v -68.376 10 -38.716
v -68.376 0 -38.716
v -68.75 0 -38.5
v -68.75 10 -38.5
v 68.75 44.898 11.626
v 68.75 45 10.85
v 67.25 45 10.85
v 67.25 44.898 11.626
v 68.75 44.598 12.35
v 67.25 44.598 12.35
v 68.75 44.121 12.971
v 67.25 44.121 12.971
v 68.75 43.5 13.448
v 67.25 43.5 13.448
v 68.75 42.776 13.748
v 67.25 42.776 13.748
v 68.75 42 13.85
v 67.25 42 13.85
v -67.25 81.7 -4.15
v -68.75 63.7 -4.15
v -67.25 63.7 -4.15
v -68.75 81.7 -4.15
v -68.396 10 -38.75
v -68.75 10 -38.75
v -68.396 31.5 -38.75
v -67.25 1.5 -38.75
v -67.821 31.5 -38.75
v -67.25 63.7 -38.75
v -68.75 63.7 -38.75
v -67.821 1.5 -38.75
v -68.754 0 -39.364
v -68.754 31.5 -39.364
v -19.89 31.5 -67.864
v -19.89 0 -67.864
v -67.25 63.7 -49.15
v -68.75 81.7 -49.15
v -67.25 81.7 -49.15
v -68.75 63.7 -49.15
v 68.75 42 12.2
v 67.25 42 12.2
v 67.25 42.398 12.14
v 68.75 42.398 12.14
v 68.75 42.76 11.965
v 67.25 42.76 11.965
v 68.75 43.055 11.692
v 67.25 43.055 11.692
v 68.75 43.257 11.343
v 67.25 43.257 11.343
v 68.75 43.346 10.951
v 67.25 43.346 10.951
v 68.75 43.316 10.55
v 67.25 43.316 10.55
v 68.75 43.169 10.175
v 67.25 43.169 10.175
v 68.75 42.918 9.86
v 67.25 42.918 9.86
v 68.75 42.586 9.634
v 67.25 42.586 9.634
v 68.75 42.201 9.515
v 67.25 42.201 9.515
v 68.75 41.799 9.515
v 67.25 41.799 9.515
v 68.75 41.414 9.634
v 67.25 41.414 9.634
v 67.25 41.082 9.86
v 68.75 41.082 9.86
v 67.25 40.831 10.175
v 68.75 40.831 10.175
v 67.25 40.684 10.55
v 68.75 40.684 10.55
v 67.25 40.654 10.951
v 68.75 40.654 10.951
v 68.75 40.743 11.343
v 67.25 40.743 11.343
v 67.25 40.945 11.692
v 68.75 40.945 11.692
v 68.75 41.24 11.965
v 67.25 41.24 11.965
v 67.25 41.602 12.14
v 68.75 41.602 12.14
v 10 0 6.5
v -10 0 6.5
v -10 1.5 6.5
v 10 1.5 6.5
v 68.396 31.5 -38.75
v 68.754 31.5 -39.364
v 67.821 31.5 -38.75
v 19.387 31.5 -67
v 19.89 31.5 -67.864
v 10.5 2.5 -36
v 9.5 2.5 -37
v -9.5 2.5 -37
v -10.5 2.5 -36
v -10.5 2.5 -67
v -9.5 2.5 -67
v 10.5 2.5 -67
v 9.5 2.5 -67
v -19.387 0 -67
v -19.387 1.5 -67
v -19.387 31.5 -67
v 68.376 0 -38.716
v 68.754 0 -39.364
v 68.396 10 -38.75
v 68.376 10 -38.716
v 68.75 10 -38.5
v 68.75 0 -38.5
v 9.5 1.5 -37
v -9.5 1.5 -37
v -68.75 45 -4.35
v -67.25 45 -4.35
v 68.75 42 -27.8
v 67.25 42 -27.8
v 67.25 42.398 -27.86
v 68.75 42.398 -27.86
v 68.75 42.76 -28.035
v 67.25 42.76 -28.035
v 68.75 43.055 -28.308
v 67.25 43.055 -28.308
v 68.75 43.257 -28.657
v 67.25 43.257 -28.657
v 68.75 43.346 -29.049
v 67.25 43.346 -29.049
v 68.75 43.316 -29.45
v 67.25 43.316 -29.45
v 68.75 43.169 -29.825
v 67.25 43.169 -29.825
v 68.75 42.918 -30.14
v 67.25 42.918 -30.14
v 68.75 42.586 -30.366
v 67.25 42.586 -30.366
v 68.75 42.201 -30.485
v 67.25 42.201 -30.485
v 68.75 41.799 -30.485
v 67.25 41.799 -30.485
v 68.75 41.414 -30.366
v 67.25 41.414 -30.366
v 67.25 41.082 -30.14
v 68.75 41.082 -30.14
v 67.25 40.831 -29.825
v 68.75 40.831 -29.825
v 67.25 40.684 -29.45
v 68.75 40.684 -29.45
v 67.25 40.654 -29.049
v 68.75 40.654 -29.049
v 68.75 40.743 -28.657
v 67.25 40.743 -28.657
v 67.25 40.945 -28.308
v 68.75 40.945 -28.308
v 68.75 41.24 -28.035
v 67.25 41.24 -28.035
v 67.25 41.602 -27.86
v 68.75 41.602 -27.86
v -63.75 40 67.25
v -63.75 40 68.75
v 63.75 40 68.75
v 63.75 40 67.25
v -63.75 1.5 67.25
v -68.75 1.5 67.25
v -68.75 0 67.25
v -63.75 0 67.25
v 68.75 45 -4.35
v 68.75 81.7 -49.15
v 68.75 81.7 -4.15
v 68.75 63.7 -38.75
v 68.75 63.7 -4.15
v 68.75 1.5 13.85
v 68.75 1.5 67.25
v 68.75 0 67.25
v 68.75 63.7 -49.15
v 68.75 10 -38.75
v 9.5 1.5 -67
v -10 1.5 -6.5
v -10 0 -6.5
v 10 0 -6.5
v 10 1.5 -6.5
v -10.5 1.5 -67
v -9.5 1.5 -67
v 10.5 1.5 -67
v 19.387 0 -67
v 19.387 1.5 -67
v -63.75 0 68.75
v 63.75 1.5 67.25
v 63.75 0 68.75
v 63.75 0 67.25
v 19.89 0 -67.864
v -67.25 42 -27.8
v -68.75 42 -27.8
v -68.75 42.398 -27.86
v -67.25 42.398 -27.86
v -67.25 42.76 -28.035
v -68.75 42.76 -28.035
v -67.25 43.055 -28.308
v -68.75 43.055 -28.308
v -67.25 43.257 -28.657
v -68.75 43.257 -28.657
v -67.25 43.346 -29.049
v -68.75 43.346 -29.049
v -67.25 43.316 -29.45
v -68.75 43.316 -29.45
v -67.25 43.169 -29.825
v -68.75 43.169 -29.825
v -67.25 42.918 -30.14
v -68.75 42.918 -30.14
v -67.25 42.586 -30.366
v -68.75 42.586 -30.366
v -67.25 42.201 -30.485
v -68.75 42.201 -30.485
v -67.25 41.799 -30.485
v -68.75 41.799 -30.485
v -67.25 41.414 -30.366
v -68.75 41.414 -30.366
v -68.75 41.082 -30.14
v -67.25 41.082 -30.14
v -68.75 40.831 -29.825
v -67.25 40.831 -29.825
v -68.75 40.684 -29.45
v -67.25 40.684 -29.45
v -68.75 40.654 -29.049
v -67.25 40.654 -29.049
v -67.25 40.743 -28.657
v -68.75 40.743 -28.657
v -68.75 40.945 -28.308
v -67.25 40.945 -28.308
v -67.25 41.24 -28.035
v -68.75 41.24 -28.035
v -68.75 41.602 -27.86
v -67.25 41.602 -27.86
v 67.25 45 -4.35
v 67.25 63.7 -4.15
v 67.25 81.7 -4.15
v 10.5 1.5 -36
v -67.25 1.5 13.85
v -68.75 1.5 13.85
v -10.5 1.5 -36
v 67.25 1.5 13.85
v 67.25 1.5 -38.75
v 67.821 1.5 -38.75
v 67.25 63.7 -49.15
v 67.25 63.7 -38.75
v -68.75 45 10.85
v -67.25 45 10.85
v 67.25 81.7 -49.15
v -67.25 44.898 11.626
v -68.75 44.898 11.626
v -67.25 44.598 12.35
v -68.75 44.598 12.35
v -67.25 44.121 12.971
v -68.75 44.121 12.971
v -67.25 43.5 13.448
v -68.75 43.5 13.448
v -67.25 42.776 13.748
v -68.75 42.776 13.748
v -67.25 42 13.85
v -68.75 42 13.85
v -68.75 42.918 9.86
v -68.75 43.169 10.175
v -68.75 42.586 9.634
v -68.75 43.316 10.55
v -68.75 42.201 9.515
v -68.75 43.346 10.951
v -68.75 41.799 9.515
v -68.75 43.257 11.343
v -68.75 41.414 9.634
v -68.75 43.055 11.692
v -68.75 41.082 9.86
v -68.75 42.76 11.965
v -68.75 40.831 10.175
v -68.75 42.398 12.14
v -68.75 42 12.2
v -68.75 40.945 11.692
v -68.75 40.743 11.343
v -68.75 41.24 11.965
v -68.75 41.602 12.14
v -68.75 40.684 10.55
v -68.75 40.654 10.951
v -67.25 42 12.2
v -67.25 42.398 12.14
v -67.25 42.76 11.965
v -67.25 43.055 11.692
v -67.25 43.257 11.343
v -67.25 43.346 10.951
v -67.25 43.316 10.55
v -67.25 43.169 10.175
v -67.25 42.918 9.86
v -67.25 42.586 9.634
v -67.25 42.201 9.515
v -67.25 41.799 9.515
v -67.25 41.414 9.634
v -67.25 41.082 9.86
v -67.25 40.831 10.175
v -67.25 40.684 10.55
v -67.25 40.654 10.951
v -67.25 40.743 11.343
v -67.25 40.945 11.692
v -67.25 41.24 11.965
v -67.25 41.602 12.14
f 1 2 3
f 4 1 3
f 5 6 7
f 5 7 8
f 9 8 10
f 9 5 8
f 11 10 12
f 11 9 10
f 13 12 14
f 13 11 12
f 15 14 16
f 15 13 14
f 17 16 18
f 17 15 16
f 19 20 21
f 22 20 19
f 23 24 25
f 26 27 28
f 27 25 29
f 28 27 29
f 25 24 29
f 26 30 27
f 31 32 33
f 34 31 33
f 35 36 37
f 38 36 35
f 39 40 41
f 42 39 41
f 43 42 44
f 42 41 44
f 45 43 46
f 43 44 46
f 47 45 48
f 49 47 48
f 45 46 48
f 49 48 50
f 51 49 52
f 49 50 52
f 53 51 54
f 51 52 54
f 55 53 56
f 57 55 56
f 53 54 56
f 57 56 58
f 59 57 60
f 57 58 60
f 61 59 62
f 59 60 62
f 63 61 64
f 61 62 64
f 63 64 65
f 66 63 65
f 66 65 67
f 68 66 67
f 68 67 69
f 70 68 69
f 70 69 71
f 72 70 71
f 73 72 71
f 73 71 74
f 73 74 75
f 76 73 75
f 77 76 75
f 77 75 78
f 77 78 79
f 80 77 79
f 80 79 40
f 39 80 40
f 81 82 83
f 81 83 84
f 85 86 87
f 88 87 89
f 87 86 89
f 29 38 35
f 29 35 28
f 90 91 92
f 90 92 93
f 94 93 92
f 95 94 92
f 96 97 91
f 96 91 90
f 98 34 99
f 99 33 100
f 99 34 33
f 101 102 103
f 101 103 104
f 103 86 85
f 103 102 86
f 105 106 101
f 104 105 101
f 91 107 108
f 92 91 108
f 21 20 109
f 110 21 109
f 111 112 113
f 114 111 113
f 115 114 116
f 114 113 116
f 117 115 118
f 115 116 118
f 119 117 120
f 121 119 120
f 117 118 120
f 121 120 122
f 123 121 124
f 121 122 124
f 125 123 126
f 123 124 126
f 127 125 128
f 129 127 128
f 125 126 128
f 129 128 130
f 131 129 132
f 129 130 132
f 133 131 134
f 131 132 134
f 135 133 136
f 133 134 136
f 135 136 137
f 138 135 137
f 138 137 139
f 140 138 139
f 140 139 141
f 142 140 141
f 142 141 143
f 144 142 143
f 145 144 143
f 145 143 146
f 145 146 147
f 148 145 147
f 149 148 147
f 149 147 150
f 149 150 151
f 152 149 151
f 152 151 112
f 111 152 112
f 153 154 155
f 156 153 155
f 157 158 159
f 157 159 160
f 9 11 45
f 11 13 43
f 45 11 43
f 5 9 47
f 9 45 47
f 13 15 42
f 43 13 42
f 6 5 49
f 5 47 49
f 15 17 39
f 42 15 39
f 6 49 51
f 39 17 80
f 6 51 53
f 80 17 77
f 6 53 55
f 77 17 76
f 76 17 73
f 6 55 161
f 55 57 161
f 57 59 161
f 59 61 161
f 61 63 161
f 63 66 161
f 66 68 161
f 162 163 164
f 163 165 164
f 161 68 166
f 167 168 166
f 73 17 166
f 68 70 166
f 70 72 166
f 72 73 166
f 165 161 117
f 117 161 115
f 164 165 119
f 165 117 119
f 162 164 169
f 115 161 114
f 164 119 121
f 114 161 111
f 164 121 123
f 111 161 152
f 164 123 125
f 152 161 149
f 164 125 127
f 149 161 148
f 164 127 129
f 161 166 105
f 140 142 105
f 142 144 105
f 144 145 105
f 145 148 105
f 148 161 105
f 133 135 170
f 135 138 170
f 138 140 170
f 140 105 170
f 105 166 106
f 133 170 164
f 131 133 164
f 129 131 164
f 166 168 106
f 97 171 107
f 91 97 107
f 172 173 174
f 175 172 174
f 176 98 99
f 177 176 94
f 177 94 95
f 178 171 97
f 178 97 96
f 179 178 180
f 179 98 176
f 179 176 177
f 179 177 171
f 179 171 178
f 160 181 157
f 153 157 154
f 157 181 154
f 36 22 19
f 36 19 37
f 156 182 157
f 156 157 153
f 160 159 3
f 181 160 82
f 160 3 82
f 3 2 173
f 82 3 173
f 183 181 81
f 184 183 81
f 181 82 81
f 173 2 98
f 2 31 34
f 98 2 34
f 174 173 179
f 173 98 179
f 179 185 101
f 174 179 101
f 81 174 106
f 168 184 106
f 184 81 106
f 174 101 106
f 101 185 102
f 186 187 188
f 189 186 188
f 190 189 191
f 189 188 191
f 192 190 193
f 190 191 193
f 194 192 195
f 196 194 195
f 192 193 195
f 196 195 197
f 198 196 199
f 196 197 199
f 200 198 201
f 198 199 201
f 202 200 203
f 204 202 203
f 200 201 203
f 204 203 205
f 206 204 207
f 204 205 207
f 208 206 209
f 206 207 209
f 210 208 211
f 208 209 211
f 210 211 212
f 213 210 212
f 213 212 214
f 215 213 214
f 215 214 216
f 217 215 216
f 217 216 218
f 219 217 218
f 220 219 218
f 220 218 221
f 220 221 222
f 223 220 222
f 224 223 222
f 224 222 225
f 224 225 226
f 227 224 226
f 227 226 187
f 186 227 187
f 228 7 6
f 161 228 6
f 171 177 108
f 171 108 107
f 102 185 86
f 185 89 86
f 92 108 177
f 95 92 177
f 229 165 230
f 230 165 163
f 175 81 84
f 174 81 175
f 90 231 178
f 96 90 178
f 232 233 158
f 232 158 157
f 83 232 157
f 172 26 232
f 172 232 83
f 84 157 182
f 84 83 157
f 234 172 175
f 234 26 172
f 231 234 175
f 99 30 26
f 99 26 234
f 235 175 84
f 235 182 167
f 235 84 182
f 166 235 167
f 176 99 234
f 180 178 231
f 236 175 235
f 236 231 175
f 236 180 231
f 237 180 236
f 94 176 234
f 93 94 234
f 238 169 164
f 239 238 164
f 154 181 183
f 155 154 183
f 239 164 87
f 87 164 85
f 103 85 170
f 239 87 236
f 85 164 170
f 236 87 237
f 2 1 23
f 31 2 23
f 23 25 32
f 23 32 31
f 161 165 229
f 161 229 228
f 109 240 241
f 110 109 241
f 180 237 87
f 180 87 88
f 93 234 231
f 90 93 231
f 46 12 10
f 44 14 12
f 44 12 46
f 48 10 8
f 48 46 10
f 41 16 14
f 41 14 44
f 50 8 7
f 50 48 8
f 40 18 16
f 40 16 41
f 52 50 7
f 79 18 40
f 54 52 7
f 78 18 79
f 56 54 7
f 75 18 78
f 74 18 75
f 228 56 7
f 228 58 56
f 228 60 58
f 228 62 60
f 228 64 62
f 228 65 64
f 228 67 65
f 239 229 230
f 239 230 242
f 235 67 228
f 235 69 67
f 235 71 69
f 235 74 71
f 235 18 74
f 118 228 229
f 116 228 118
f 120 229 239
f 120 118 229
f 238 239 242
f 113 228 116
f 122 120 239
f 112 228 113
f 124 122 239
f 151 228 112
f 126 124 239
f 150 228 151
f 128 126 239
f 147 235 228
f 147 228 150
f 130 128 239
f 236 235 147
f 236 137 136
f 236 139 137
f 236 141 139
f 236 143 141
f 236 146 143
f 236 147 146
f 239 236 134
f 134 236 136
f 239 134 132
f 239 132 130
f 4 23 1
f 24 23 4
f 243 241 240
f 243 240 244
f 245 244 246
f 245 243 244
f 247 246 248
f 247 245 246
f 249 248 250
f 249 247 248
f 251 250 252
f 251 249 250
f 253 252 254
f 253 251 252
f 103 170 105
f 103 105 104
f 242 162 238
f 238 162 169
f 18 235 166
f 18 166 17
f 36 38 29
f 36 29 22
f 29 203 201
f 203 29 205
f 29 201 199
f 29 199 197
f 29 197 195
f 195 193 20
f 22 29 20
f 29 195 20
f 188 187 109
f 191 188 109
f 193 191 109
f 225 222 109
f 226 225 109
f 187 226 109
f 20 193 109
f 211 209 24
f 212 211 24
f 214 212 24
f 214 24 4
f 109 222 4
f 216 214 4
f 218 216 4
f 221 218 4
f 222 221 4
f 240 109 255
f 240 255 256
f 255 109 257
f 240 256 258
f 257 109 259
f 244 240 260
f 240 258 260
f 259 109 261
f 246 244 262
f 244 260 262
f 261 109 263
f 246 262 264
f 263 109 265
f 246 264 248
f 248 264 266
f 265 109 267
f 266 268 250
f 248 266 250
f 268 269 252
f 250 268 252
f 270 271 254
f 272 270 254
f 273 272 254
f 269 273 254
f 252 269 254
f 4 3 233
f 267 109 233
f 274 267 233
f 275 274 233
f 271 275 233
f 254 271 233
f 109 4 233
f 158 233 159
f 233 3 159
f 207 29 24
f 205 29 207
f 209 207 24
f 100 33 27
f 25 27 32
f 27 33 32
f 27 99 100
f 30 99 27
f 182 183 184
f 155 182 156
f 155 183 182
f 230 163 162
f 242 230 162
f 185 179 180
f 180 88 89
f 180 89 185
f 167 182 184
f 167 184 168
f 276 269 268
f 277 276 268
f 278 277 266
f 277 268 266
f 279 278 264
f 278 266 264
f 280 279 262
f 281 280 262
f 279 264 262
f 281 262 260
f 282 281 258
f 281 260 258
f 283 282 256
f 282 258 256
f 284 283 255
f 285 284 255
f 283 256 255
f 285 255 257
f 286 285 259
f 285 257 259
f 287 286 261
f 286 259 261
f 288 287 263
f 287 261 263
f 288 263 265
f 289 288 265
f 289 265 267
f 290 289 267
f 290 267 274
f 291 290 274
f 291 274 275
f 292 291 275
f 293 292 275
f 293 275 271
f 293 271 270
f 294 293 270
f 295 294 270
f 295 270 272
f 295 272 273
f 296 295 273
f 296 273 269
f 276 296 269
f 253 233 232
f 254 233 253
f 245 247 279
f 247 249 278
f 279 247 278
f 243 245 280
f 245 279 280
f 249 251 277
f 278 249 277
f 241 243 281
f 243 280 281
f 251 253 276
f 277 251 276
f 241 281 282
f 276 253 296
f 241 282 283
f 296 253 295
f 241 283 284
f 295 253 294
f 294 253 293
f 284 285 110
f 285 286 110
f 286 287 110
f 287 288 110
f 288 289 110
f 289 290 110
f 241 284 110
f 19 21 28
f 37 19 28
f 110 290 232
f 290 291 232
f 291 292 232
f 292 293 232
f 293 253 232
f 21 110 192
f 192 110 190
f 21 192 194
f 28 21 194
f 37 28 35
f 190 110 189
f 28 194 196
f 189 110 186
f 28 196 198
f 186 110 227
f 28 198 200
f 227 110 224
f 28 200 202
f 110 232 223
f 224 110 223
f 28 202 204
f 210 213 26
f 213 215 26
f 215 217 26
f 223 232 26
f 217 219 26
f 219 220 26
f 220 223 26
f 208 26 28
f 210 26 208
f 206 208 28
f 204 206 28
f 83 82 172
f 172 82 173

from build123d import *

# Parameters (mm, degrees)
SKETCH1_W                = 134
SKETCH1_H                = 134
SKETCH1_W_2              = 20
SKETCH1_H_2              = 13
BOSS_EXTRUDE1_DEPTH      = 1.5
BOSS_EXTRUDE2_DEPTH      = 45
SKETCH2_R                = 1.35
CUT_EXTRUDE1_DEPTH       = 137.5
SKETCH3_W                = 53.4
SKETCH3_H                = 43.5
CUT_EXTRUDE2_DEPTH       = 137.5
SKETCH4_W                = 140
SKETCH4_H                = 5
CUT_EXTRUDE3_DEPTH       = 1.5
SKETCH5_W                = 30
SKETCH5_H                = 43.5
CUT_EXTRUDE4_DEPTH       = 137.5
CUT_EXTRUDE5_DEPTH       = 10
BOSS_EXTRUDE3_DEPTH      = 1.5
BOSS_EXTRUDE4_DEPTH      = 1
BOSS_EXTRUDE5_DEPTH      = 30
BOSS_EXTRUDE5_DEPTH_BACK = 1.5
CUT_EXTRUDE6_DEPTH       = 137.5
SKETCH11_W               = 5
SKETCH11_H               = 40
CUT_EXTRUDE7_DEPTH       = 1.5
BOSS_EXTRUDE6_DEPTH      = 1.5


with BuildPart() as part:
    # Sketch1 → Boss-Extrude1 (new body)
    with BuildSketch(Plane(origin=(0, 0, 0), x_dir=(1, 0, 0), z_dir=(0, 1, 0))):
        Rectangle(SKETCH1_W, SKETCH1_H)
        Rectangle(SKETCH1_W_2, SKETCH1_H_2, mode=Mode.SUBTRACT)
        Polygon((-67, 67), (-67.25, 67.25), (-67.25, -67.25), (67.25, -67.25), (67.25, 67.25), (67, 67), (67, -67), (-67, -67), align=None)
    extrude(amount=BOSS_EXTRUDE1_DEPTH)

    # Sketch1<3> → Boss-Extrude2 (add)
    with BuildSketch(Plane(origin=(0, 0, 0), x_dir=(1, 0, 0), z_dir=(0, 1, 0))):
        Polygon((-67.25, -67.25), (-67.25, 67.25), (-68.75, 68.75), (-68.75, -68.75), (68.75, -68.75), (68.75, 68.75), (67.25, 67.25), (67.25, -67.25), align=None)
    extrude(amount=BOSS_EXTRUDE2_DEPTH)

    # Sketch2 → Cut-Extrude1 (cut)
    with BuildSketch(Plane.ZY.offset(68.75)):
        with Locations((10.85, 42)):
            Circle(SKETCH2_R)
        with Locations((-29.15, 42)):
            Circle(SKETCH2_R)
    extrude(amount=-CUT_EXTRUDE1_DEPTH, mode=Mode.SUBTRACT)

    # Sketch3 → Cut-Extrude2 (cut)
    with BuildSketch(Plane.ZY.offset(68.75)):
        with Locations((40.55, 23.25)):
            Rectangle(SKETCH3_W, SKETCH3_H)
    extrude(amount=-CUT_EXTRUDE2_DEPTH, mode=Mode.SUBTRACT)

    # Sketch4 → Cut-Extrude3 (cut)
    with BuildSketch(Plane.XY.offset(68.75)):
        with Locations((0, 42.5)):
            Rectangle(SKETCH4_W, SKETCH4_H)
    extrude(amount=-CUT_EXTRUDE3_DEPTH, mode=Mode.SUBTRACT)

    # Sketch5 → Cut-Extrude4 (cut)
    with BuildSketch(Plane.ZY.offset(68.75)):
        with Locations((-53.75, 23.25)):
            Rectangle(SKETCH5_W, SKETCH5_H)
    extrude(amount=-CUT_EXTRUDE4_DEPTH, mode=Mode.SUBTRACT)

    # Sketch6 → Cut-Extrude5 (cut)
    with BuildSketch(Plane(origin=(0, 0, 0), x_dir=(-1, 0, 0), z_dir=(0, -1, 0))):
        Polygon((67, 67), (68.75, 67), (68.75, 68.75), align=None)
        Polygon((19.386551984, 67), (68.75, 38.5), (68.75, 67), (67, 67), align=None)
        Polygon((-68.75, 38.5), (-19.386551984, 67), (-67, 67), (-68.75, 67), align=None)
        Polygon((-68.75, 67), (-67, 67), (-68.75, 68.75), align=None)
    extrude(amount=-CUT_EXTRUDE5_DEPTH, mode=Mode.SUBTRACT)


with BuildPart() as body_2:
    # Sketch7 → Boss-Extrude3 (new body)
    with BuildSketch(Plane(origin=(-68.75, 0, 0), x_dir=(0, 0, -1), z_dir=(-1, 0, 0))):
        Polygon((49.15, -63.7), (38.75, -63.7), (38.75, -45), (19.55, -45), (19.55, -63.7), (4.15, -63.7), (4.15, -81.7), (49.15, -81.7), align=None)
    boss_extrude3 = extrude(amount=-BOSS_EXTRUDE3_DEPTH)


with BuildPart() as part_1:
    add(part.part)

    # Mirror6: Boss-Extrude3 across plane
    add(boss_extrude3.mirror(Plane(origin=(0, 0, 0), x_dir=(0, 0, 1), z_dir=(1, 0, 0))))


with BuildPart() as body_2_1:
    add(body_2.part)

    # Combine1: union part
    add(part_1.part)

    # Sketch8 → Boss-Extrude4 (add)
    with BuildSketch(Plane(origin=(0, 1.5, 0), x_dir=(1, 0, 0), z_dir=(0, 1, 0))):
        Polygon((-9.5, 37), (-9.5, 67), (-10.5, 67), (-10.5, 36), (0, 36), (0, 37), align=None)
        Polygon((10.5, 67), (9.5, 67), (9.5, 37), (0, 37), (0, 36), (10.5, 36), align=None)
    extrude(amount=BOSS_EXTRUDE4_DEPTH)

    # Sketch9 → Boss-Extrude5 (add, two sides)
    with BuildSketch(Plane(origin=(0, 1.5, 0), x_dir=(1, 0, 0), z_dir=(0, 1, 0))) as boss_extrude5_sk:
        Polygon((-19.386551984, 67), (-68.25, 38.5), (-68.753822513, 39.363807198), (-19.890374497, 67.863807198), align=None)
        Polygon((19.890374497, 67.863807198), (68.753822513, 39.363807198), (68.25, 38.5), (19.386551984, 67), align=None)
    extrude(amount=BOSS_EXTRUDE5_DEPTH)
    extrude(boss_extrude5_sk.sketch, amount=-BOSS_EXTRUDE5_DEPTH_BACK)

    # Sketch10 → Cut-Extrude6 (cut)
    with BuildSketch(Plane(origin=(68.75, 0, 0), x_dir=(0, 0, -1), z_dir=(1, 0, 0))):
        with BuildLine():
            Line((-13.85, 42), (-13.85, 45))
            Line((-13.85, 45), (-10.85, 45))
            ThreePointArc((-10.85, 45), (-12.971320344, 44.121320344), (-13.85, 42))
        make_face()
    extrude(amount=-CUT_EXTRUDE6_DEPTH, mode=Mode.SUBTRACT)

    # Sketch11 → Cut-Extrude7 (cut)
    with BuildSketch(Plane.XY.offset(68.75)):
        with Locations((66.25, 20)):
            Rectangle(SKETCH11_W, SKETCH11_H)
        with Locations((-66.25, 20)):
            Rectangle(SKETCH11_W, SKETCH11_H)
    extrude(amount=-CUT_EXTRUDE7_DEPTH, mode=Mode.SUBTRACT)


with BuildPart() as body_2_2:
    # Sketch12 → Boss-Extrude6 (new body)
    with BuildSketch(Plane(origin=(68.75, 0, 0), x_dir=(0, 0, -1), z_dir=(1, 0, 0))):
        Polygon((4.15, 63.7), (4.35, 45), (19.55, 45), (19.55, 63.7), align=None)
    extrude(amount=-BOSS_EXTRUDE6_DEPTH)


with BuildPart() as body_3:
    # Mirror8: mirrored copy
    add(body_2_2.part.mirror(Plane(origin=(0, 0, 0), x_dir=(0, 0, 1), z_dir=(1, 0, 0))))


with BuildPart() as body_2_2_1:
    add(body_2_2.part)

    # Combine2: union body 3, body 2
    add(body_3.part)
    add(body_2_1.part)


solid = body_2_2_1.part
